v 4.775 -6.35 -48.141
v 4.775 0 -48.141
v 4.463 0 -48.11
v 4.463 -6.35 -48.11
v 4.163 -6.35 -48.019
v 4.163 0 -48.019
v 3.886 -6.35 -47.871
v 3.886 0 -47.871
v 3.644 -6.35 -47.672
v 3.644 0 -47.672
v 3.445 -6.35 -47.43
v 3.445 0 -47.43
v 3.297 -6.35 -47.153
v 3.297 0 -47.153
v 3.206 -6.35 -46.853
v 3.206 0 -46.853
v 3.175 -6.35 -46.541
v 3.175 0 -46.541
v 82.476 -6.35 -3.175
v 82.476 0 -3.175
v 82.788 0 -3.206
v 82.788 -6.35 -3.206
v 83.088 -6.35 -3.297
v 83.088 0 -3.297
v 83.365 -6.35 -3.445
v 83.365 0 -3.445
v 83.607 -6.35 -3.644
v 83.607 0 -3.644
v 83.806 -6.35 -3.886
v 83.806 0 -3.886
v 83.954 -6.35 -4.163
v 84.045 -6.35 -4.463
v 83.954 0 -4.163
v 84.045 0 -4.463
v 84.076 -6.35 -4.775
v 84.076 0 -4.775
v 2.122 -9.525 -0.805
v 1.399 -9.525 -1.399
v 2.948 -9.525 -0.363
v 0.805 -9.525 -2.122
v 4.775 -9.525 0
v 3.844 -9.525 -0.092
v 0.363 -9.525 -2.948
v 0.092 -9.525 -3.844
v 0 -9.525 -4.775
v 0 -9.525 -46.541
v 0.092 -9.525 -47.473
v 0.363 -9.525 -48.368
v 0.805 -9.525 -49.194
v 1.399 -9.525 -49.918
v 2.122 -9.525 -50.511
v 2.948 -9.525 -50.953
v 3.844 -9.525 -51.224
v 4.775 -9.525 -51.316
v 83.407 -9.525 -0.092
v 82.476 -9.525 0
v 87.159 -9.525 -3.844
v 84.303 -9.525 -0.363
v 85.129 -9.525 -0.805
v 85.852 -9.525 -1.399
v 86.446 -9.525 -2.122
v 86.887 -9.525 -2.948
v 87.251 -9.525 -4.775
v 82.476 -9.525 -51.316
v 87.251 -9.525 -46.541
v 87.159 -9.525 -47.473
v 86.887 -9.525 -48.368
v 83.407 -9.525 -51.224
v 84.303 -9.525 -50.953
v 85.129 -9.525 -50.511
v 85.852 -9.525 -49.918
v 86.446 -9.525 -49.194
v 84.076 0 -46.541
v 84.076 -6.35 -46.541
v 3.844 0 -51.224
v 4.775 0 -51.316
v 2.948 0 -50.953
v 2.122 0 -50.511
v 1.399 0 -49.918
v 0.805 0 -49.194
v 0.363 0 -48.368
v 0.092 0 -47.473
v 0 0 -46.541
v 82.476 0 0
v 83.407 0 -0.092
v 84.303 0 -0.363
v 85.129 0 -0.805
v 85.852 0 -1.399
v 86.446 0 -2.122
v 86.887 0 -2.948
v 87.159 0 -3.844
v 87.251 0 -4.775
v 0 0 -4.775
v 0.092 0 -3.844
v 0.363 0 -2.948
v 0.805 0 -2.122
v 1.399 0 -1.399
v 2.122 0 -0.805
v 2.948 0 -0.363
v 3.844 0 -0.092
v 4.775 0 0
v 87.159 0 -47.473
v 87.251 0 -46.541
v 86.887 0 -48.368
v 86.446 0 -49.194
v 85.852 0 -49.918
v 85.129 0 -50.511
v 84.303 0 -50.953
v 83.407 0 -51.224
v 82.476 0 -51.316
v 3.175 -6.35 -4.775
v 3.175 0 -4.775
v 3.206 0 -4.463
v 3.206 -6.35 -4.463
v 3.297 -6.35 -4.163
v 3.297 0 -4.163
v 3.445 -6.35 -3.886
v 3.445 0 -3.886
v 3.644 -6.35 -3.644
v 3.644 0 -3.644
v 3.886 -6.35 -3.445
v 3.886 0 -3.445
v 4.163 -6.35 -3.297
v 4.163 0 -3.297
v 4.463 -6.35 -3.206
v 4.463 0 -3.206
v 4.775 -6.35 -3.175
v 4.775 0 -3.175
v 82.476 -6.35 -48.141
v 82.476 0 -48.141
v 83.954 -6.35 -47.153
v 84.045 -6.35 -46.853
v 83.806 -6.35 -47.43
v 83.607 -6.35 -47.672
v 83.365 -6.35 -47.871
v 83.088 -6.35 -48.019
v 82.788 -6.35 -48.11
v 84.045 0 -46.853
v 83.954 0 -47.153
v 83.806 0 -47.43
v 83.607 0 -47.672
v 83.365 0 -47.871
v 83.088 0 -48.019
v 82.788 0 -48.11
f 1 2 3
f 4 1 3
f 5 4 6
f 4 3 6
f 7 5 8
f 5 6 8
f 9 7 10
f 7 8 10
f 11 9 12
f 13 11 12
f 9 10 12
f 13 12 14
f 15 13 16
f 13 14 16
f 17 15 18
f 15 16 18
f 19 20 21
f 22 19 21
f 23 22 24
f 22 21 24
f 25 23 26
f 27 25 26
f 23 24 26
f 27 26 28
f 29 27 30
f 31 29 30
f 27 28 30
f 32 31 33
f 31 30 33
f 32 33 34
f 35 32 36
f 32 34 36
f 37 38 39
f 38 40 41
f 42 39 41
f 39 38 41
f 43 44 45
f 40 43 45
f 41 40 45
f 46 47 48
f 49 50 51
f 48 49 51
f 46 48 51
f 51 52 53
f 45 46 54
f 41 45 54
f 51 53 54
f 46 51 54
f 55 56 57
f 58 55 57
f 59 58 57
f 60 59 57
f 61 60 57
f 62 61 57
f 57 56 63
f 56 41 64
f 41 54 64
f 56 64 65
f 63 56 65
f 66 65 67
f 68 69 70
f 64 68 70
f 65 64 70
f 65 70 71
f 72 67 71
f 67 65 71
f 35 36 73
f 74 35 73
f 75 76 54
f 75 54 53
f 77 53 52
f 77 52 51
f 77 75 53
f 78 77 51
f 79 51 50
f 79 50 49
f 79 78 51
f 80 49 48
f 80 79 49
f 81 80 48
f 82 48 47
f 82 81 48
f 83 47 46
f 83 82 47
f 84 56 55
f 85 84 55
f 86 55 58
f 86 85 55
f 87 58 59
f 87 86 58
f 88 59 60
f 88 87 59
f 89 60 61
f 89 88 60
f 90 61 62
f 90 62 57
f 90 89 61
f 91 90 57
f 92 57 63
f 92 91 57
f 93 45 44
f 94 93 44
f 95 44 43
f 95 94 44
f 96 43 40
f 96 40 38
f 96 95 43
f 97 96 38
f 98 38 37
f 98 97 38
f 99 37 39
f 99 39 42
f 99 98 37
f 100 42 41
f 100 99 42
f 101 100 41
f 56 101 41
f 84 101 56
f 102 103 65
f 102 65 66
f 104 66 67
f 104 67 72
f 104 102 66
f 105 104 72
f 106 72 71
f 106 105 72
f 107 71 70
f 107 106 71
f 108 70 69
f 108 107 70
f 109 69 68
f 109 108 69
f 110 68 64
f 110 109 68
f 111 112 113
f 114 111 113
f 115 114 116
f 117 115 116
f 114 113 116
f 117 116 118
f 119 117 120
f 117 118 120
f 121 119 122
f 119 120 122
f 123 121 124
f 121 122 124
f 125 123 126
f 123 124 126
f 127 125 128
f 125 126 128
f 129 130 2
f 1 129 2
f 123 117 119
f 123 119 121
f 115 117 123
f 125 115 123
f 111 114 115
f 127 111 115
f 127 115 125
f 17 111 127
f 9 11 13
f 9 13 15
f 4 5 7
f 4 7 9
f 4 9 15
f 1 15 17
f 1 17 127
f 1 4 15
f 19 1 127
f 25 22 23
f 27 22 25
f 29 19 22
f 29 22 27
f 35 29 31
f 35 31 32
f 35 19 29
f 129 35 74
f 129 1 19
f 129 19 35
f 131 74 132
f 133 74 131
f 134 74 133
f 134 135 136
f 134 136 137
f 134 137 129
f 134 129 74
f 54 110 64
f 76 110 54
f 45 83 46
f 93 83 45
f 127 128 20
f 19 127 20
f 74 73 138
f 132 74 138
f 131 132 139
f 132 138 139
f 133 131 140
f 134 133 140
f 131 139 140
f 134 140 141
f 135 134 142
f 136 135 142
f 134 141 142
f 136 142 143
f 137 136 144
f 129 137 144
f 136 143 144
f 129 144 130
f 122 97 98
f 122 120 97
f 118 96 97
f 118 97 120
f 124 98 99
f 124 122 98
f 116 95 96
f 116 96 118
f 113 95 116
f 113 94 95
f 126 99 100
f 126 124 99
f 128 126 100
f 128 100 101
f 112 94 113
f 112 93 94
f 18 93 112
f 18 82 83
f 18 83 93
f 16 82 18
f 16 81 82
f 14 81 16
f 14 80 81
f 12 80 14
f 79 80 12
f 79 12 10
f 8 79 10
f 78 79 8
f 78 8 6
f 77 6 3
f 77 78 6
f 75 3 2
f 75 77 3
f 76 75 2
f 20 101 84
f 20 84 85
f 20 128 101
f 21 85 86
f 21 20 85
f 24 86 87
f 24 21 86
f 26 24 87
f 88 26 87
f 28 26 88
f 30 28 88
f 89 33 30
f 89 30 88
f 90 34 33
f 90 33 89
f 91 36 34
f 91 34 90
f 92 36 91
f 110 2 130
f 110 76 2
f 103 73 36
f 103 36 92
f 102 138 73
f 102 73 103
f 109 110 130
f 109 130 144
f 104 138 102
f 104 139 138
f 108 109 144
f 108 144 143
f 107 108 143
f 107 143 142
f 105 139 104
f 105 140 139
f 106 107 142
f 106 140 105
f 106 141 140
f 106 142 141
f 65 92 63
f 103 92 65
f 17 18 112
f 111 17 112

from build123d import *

# Parameters (mm, degrees)
EXTRUDE1_DEPTH = 9.525
EXTRUDE2_DEPTH = 6.35


with BuildPart() as part:
    # Sketch1 → Extrude1 (new body)
    with BuildSketch(Plane(origin=(0, 0, 0), x_dir=(1, 0, 0), z_dir=(0, 1, 0))):
        with BuildLine():
            Line((4.7752, 0), (82.475669818, 0))
            ThreePointArc((82.475669818, 0), (85.852246119, 1.398623698), (87.250869818, 4.7752))
            Line((87.250869818, 4.7752), (87.250869818, 46.540933005))
            ThreePointArc((87.250869818, 46.540933005), (85.852246119, 49.917509306), (82.475669818, 51.316133005))
            Line((82.475669818, 51.316133005), (4.7752, 51.316133005))
            ThreePointArc((4.7752, 51.316133005), (1.398623698, 49.917509306), (0, 46.540933005))
            Line((0, 46.540933005), (0, 4.7752))
            ThreePointArc((0, 4.7752), (1.398623698, 1.398623698), (4.7752, 0))
        make_face()
    extrude(amount=-EXTRUDE1_DEPTH)

    # Sketch2 → Extrude2 (cut)
    with BuildSketch(Plane(origin=(0, 0, 0), x_dir=(1, 0, 0), z_dir=(0, 1, 0))):
        with BuildLine():
            Line((3.175, 46.540933005), (3.175, 4.7752))
            ThreePointArc((3.175, 4.7752), (3.643687729, 3.643687729), (4.7752, 3.175))
            Line((4.7752, 3.175), (82.475669818, 3.175))
            ThreePointArc((82.475669818, 3.175), (83.607182089, 3.643687729), (84.075869818, 4.7752))
            Line((84.075869818, 4.7752), (84.075869818, 46.540933005))
            ThreePointArc((84.075869818, 46.540933005), (83.607182089, 47.672445276), (82.475669818, 48.141133005))
            Line((82.475669818, 48.141133005), (4.7752, 48.141133005))
            ThreePointArc((4.7752, 48.141133005), (3.643687729, 47.672445276), (3.175, 46.540933005))
        make_face()
    extrude(amount=-EXTRUDE2_DEPTH, mode=Mode.SUBTRACT)


solid = part.part
